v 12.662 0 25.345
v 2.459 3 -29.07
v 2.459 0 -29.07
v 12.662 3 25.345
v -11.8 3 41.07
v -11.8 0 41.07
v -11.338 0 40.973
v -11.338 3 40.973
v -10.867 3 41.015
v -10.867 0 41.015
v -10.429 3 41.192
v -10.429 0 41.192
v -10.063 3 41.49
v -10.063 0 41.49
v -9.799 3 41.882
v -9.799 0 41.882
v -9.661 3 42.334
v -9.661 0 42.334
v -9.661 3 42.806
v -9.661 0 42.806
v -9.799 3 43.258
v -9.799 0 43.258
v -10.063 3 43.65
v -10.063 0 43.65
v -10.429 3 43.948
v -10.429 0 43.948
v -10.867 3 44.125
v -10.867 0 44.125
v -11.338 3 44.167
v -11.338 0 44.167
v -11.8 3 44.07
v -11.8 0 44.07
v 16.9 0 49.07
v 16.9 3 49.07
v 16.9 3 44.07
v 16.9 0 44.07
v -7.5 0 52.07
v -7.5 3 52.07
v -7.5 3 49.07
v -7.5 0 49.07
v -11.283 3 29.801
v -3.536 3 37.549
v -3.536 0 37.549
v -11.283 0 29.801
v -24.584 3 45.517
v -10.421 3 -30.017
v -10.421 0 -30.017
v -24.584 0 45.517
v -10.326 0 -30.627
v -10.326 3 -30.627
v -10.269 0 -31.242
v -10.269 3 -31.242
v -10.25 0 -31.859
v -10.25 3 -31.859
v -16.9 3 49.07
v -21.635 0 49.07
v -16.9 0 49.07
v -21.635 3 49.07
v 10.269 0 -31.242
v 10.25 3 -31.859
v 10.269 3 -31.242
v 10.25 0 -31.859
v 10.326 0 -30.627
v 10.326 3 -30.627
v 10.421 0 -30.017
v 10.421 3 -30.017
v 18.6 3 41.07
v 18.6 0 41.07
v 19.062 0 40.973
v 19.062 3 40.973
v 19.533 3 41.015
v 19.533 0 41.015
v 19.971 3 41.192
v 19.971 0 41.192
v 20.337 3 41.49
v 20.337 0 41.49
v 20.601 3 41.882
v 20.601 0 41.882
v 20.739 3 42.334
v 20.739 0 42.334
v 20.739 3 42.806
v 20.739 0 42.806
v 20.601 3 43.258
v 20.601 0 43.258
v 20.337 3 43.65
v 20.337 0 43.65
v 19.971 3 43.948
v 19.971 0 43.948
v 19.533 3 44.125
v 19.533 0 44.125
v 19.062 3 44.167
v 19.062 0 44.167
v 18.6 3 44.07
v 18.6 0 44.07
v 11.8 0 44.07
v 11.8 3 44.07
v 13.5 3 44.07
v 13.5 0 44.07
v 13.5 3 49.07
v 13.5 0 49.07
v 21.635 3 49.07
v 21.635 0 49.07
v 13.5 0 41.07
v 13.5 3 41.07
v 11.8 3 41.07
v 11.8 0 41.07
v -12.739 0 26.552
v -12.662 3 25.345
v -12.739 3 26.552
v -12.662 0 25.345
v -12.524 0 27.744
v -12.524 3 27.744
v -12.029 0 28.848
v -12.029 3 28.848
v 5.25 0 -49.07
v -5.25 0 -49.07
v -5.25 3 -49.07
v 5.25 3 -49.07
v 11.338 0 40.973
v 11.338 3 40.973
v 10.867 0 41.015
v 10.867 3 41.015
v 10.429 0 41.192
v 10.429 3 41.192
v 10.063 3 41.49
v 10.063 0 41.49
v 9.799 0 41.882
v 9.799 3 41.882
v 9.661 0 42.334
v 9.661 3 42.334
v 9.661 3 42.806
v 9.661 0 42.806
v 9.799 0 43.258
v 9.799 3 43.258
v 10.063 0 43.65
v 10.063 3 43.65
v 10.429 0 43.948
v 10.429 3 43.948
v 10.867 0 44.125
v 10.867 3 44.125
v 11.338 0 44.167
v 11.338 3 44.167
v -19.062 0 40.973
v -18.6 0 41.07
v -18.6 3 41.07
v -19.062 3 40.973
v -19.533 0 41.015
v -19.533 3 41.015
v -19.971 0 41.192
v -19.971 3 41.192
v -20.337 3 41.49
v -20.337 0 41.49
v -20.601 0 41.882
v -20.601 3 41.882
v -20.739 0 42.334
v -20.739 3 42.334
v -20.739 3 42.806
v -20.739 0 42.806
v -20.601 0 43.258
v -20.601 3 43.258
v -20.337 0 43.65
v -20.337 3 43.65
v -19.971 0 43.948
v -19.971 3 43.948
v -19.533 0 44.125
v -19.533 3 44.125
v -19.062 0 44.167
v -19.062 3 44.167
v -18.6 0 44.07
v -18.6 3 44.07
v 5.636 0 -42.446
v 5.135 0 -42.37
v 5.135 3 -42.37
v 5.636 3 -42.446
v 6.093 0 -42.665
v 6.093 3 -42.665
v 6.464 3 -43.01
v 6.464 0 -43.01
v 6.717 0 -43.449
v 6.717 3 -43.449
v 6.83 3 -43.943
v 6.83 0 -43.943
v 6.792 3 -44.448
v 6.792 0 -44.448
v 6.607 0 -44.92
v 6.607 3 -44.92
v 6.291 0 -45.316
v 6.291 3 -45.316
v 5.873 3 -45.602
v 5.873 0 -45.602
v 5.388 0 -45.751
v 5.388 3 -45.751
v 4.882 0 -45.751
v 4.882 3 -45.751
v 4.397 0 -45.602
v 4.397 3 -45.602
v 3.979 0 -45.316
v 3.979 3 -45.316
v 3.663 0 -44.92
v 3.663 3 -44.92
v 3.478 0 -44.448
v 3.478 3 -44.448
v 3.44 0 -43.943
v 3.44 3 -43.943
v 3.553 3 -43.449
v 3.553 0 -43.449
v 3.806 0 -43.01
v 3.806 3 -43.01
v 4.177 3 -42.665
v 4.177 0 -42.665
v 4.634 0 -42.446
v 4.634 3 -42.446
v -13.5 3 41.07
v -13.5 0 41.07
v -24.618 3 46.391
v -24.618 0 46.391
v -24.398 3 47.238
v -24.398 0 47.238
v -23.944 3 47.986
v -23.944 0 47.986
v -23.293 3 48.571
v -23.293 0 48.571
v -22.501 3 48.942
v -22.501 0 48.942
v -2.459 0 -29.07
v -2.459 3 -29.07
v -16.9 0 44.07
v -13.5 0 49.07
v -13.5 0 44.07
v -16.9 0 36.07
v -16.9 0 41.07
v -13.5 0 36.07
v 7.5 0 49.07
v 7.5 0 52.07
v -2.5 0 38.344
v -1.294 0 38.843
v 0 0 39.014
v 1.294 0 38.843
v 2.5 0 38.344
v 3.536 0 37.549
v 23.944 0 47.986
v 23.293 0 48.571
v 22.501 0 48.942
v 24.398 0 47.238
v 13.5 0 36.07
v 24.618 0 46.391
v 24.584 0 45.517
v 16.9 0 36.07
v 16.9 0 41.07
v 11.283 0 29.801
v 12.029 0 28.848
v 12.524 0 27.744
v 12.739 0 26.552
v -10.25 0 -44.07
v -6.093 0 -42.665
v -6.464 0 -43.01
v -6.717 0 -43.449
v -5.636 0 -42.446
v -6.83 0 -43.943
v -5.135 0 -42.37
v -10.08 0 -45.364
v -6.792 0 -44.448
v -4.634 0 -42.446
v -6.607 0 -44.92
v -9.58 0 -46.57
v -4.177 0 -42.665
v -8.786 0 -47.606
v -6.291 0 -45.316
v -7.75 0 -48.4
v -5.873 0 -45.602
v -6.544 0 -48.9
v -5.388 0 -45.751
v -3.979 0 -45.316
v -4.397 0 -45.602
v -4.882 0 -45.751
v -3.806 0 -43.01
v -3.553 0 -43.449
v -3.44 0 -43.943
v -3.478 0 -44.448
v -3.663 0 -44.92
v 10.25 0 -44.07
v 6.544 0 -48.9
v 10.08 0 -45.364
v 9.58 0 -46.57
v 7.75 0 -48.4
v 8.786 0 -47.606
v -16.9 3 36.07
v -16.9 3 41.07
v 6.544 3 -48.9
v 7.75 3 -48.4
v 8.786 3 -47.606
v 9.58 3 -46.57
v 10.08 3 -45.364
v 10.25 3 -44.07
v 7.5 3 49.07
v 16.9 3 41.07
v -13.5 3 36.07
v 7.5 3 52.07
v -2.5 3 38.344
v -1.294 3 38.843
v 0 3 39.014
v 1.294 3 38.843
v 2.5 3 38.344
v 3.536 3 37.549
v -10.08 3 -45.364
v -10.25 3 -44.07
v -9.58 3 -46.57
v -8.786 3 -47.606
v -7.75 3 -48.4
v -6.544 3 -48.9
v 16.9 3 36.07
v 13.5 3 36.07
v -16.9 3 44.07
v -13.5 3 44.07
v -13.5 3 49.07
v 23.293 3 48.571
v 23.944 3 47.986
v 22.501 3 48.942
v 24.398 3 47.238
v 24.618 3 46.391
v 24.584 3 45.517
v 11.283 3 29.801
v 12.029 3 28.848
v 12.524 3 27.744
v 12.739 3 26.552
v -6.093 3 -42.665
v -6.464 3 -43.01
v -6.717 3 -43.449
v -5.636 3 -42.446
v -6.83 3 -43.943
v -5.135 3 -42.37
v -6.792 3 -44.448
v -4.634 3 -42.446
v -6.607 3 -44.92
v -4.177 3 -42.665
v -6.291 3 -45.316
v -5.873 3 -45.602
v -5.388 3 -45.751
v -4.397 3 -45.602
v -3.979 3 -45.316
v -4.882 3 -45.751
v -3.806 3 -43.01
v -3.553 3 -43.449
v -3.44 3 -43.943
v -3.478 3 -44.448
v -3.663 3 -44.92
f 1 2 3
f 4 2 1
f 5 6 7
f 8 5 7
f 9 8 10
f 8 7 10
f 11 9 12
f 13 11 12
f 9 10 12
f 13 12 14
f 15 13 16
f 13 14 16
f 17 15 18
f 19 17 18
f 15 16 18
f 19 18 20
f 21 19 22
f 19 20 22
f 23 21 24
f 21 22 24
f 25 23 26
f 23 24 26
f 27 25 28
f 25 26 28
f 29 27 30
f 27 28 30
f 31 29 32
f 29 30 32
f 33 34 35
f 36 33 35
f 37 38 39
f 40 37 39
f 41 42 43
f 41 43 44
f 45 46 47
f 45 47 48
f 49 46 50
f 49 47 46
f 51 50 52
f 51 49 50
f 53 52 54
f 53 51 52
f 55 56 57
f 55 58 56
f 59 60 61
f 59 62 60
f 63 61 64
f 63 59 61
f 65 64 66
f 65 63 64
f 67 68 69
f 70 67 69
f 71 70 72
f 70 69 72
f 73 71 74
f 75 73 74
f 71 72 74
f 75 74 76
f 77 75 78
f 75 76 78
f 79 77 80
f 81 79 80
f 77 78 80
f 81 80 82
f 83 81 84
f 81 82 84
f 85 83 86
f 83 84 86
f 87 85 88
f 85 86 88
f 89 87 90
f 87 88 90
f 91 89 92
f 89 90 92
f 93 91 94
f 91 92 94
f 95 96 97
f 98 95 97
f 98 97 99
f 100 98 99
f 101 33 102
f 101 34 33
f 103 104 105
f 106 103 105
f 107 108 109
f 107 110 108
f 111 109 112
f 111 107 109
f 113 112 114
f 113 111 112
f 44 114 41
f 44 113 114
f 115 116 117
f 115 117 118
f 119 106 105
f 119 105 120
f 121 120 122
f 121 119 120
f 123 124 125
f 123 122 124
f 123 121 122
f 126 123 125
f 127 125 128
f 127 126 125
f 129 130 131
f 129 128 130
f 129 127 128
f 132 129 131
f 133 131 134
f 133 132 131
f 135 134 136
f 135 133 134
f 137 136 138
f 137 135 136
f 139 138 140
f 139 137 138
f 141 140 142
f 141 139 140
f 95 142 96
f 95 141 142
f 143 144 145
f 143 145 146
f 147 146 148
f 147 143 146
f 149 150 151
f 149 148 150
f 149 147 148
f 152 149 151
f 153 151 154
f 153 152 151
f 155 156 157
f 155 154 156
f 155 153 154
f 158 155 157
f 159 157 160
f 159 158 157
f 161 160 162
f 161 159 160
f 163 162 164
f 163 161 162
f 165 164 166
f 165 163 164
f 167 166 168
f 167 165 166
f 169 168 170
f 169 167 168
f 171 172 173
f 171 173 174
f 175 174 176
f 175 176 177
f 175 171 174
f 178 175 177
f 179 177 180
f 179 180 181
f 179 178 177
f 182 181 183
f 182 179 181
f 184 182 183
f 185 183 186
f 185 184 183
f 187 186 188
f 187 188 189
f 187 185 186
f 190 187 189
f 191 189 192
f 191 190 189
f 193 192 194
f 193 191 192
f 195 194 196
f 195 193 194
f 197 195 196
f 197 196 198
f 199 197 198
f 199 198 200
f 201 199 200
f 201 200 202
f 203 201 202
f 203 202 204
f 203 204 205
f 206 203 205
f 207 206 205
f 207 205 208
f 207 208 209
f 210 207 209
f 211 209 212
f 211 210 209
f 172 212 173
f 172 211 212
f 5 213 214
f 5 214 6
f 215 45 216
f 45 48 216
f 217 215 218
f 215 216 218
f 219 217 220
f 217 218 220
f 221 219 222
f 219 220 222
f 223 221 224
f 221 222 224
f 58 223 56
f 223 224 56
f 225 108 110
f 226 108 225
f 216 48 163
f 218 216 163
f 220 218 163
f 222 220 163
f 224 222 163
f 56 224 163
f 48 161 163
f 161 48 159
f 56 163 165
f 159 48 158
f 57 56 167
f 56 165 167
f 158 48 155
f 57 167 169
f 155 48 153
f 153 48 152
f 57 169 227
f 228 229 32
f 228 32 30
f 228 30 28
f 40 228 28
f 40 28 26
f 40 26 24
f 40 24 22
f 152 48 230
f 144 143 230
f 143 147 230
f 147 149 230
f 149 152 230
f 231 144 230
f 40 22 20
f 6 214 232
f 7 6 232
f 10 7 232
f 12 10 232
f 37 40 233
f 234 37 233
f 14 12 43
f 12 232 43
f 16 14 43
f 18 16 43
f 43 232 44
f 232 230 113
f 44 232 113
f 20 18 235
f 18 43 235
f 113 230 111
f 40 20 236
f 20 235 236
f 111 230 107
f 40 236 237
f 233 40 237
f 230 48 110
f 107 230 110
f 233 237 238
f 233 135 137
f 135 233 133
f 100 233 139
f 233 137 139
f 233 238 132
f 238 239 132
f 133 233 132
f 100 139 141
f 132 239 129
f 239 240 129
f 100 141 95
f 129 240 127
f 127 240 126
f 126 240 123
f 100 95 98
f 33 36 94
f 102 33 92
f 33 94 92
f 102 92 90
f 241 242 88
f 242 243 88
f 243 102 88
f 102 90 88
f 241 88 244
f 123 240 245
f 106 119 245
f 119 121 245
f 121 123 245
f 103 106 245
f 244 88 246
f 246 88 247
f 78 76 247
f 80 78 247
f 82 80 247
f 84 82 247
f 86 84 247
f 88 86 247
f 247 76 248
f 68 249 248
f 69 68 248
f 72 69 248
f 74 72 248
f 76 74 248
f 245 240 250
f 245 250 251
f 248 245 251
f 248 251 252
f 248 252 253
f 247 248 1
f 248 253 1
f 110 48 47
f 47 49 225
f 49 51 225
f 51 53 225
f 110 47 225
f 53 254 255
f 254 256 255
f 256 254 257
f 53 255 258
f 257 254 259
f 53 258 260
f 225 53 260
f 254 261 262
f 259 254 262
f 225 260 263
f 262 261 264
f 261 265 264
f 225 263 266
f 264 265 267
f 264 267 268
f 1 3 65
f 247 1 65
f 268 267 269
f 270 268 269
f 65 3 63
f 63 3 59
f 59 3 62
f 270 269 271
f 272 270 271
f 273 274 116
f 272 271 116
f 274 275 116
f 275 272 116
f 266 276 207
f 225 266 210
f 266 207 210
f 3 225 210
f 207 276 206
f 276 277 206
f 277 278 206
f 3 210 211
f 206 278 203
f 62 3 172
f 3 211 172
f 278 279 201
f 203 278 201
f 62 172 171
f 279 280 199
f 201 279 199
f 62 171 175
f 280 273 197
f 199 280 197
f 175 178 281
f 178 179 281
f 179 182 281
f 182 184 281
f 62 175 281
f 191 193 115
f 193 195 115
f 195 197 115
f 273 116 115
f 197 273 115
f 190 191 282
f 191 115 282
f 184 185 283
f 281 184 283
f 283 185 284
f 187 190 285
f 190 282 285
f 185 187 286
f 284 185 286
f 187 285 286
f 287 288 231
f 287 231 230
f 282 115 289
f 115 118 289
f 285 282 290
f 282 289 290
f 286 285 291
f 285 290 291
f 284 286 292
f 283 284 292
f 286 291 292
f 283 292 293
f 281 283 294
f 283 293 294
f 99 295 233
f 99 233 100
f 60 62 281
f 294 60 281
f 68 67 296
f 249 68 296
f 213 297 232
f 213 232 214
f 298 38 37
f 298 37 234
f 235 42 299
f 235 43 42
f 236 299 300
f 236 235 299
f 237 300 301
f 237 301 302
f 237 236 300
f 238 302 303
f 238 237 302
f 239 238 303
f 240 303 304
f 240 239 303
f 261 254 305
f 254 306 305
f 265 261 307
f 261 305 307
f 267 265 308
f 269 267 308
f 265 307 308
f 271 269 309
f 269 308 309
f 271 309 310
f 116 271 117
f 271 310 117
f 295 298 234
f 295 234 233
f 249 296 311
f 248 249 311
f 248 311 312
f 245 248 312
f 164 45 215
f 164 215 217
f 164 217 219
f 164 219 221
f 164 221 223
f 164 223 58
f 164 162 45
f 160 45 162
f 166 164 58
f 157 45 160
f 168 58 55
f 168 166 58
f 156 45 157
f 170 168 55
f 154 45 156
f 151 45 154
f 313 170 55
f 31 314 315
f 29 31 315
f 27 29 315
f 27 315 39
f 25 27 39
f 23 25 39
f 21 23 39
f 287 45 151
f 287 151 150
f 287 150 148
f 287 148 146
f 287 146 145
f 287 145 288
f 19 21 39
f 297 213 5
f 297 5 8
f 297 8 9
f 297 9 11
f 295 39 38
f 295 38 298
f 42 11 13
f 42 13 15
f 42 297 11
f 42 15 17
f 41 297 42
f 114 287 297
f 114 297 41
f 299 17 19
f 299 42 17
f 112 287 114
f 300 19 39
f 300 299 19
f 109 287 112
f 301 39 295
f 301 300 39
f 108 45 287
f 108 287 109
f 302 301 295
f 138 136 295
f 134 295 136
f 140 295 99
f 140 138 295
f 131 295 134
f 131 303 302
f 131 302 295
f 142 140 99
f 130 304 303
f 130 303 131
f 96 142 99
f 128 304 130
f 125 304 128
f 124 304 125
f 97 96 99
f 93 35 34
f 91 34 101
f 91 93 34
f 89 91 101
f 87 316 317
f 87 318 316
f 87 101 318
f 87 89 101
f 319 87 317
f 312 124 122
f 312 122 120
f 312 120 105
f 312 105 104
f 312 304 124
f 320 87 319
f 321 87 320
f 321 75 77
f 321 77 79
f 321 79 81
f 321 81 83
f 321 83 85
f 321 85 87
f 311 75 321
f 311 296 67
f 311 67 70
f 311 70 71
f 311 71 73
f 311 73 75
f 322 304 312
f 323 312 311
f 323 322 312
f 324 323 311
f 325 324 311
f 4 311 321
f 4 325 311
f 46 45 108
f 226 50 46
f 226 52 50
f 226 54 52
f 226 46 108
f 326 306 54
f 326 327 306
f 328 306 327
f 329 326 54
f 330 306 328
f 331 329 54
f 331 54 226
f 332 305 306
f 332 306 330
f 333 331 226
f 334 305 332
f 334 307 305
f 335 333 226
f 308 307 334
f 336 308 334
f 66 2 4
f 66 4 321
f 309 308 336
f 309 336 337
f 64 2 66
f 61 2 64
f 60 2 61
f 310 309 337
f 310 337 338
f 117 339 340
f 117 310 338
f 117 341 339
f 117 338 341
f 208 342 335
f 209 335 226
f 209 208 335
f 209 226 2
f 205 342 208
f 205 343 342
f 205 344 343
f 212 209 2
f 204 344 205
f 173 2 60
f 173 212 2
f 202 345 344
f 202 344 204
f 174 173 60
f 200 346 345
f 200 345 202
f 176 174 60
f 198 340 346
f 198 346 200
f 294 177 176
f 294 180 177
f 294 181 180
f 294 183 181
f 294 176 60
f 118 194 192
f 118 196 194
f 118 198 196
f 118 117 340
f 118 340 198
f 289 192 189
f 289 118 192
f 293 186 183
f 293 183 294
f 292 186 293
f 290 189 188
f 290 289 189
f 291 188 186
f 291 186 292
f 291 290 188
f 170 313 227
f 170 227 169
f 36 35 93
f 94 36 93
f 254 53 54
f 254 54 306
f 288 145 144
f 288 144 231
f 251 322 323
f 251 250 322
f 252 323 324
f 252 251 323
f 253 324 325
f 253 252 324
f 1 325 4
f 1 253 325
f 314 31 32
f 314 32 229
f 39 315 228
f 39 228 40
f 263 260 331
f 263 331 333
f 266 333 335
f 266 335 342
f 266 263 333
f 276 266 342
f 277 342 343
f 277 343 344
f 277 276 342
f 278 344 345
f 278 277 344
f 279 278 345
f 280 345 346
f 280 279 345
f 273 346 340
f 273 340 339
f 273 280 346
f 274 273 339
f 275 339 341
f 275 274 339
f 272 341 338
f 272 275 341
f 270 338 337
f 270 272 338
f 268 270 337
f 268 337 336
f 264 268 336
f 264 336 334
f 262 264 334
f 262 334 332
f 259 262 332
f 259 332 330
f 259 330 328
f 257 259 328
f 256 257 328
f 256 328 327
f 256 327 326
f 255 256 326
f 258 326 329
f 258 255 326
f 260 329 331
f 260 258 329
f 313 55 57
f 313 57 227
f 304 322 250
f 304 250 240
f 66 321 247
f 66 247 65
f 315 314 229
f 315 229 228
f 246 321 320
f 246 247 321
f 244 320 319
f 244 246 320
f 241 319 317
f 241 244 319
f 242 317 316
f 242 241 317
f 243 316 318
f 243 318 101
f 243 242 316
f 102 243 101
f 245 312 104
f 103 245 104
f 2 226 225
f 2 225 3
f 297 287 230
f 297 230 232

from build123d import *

# Parameters (mm, degrees)
SKETCH_1_W          = 20.5
SKETCH_1_H          = 98.14
SKETCH_1_R          = 1.7
EXTRUDE_1_DEPTH     = 3
FILLET_1_R          = 5
EXTRUDE_2_DEPTH     = 3
FILLET_2_R          = 10
SKETCH_3_W          = 15
SKETCH_3_H          = 3
EXTRUDE_3_DEPTH     = 3
CUT_EXTRUDE_1_DEPTH = 10
CUT_EXTRUDE_2_DEPTH = 10
FILLET_3_R          = 5
FILLET_4_R          = 3
CUT_EXTRUDE_3_DEPTH = 10


with BuildPart() as part:
    # 草图1 → 凸台-拉伸1 (new body)
    with BuildSketch(Plane(origin=(0, 0, 0), x_dir=(1, 0, 0), z_dir=(0, 1, 0))):
        Rectangle(SKETCH_1_W, SKETCH_1_H)
        with Locations(Location((-5.135, 44.07, 0), (0, 0, 270))):
            Circle(SKETCH_1_R, mode=Mode.SUBTRACT)
        with Locations(Location((5.135, 44.07, 0), (0, 0, 270))):
            Circle(SKETCH_1_R, mode=Mode.SUBTRACT)
    extrude(amount=EXTRUDE_1_DEPTH)

    # 圆角1
    fillet_1_edges = [part.edges().sort_by_distance(p)[0] for p in [
        (-10.25, 1.5, -49.07),
        (10.25, 1.5, -49.07),
    ]]
    fillet(fillet_1_edges, radius=FILLET_1_R)

    # 草图2 → 凸台-拉伸2 (add)
    with BuildSketch(Plane(origin=(0, 3, 0), x_dir=(1, 0, 0), z_dir=(0, 1, 0))):
        Polygon((-10.25, 30.93), (-25.25, -49.07), (-10.25, -49.07), align=None)
        Polygon((10.25, 30.93), (10.25, -49.07), (25.25, -49.07), align=None)
    extrude(amount=-EXTRUDE_2_DEPTH)

    # 圆角2
    fillet_2_edges = [part.edges().sort_by_distance(p)[0] for p in [
        (-10.25, 1.5, -30.93),
        (10.25, 1.5, -30.93),
    ]]
    fillet(fillet_2_edges, radius=FILLET_2_R)

    # 草图3 → 凸台-拉伸3 (add)
    with BuildSketch(Plane(origin=(0, 3, 0), x_dir=(1, 0, 0), z_dir=(0, 1, 0))):
        with Locations((0, -50.57)):
            Rectangle(SKETCH_3_W, SKETCH_3_H)
    extrude(amount=-EXTRUDE_3_DEPTH)

    # 草图5 → 切除-拉伸1 (cut)
    with BuildSketch(Plane(origin=(0, 3, 0), x_dir=(1, 0, 0), z_dir=(0, 1, 0))):
        Polygon((-16.9, -49.07), (-16.9, -44.07), (-18.6, -44.07), (-18.6, -41.07), (-16.9, -41.07), (-16.9, -36.07), (-13.5, -36.07), (-13.5, -41.07), (-11.8, -41.07), (-11.8, -44.07), (-13.5, -44.07), (-13.5, -49.07), align=None)
        Polygon((13.5, -49.07), (16.9, -49.07), (16.9, -44.07), (18.6, -44.07), (18.6, -41.07), (16.9, -41.07), (16.9, -36.07), (13.5, -36.07), (13.5, -41.07), (11.8, -41.07), (11.8, -44.07), (13.5, -44.07), align=None)
    extrude(amount=-CUT_EXTRUDE_1_DEPTH, mode=Mode.SUBTRACT)

    # 草图6 → 切除-拉伸2 (cut)
    with BuildSketch(Plane(origin=(0, 3, 0), x_dir=(1, 0, 0), z_dir=(0, 1, 0))):
        Polygon((-2.459339702, 29.07), (2.459339702, 29.07), (13.148083743, -27.936634883), (0, -41.084718626), (-13.148083743, -27.936634883), align=None)
    extrude(amount=-CUT_EXTRUDE_2_DEPTH, mode=Mode.SUBTRACT)

    # 圆角3
    fillet_3_edges = [part.edges().sort_by_distance(p)[0] for p in [
        (-13.148083743, 1.5, 27.936634883),
        (13.148083743, 1.5, 27.936634883),
        (0, 1.5, 41.084718626),
    ]]
    fillet(fillet_3_edges, radius=FILLET_3_R)

    # 圆角4
    fillet_4_edges = [part.edges().sort_by_distance(p)[0] for p in [
        (-25.25, 1.5, 49.07),
        (25.25, 1.5, 49.07),
    ]]
    fillet(fillet_4_edges, radius=FILLET_4_R)

    # 草图7 → 切除-拉伸3 (cut)
    with BuildSketch(Plane.XZ):
        with BuildLine():
            Line((-18.6, 44.07), (-18.6, 41.07))
            ThreePointArc((-18.6, 41.07), (-20.756776436, 42.57), (-18.6, 44.07))
        make_face()
        with BuildLine():
            Line((-11.8, 44.07), (-11.8, 41.07))
            ThreePointArc((-11.8, 41.07), (-9.643223564, 42.57), (-11.8, 44.07))
        make_face()
        with BuildLine():
            Line((11.8, 44.07), (11.8, 41.07))
            ThreePointArc((11.8, 41.07), (9.643223564, 42.57), (11.8, 44.07))
        make_face()
        with BuildLine():
            Line((18.6, 44.07), (18.6, 41.07))
            ThreePointArc((18.6, 41.07), (20.756776436, 42.57), (18.6, 44.07))
        make_face()
    extrude(amount=-CUT_EXTRUDE_3_DEPTH, mode=Mode.SUBTRACT)


solid = part.part
